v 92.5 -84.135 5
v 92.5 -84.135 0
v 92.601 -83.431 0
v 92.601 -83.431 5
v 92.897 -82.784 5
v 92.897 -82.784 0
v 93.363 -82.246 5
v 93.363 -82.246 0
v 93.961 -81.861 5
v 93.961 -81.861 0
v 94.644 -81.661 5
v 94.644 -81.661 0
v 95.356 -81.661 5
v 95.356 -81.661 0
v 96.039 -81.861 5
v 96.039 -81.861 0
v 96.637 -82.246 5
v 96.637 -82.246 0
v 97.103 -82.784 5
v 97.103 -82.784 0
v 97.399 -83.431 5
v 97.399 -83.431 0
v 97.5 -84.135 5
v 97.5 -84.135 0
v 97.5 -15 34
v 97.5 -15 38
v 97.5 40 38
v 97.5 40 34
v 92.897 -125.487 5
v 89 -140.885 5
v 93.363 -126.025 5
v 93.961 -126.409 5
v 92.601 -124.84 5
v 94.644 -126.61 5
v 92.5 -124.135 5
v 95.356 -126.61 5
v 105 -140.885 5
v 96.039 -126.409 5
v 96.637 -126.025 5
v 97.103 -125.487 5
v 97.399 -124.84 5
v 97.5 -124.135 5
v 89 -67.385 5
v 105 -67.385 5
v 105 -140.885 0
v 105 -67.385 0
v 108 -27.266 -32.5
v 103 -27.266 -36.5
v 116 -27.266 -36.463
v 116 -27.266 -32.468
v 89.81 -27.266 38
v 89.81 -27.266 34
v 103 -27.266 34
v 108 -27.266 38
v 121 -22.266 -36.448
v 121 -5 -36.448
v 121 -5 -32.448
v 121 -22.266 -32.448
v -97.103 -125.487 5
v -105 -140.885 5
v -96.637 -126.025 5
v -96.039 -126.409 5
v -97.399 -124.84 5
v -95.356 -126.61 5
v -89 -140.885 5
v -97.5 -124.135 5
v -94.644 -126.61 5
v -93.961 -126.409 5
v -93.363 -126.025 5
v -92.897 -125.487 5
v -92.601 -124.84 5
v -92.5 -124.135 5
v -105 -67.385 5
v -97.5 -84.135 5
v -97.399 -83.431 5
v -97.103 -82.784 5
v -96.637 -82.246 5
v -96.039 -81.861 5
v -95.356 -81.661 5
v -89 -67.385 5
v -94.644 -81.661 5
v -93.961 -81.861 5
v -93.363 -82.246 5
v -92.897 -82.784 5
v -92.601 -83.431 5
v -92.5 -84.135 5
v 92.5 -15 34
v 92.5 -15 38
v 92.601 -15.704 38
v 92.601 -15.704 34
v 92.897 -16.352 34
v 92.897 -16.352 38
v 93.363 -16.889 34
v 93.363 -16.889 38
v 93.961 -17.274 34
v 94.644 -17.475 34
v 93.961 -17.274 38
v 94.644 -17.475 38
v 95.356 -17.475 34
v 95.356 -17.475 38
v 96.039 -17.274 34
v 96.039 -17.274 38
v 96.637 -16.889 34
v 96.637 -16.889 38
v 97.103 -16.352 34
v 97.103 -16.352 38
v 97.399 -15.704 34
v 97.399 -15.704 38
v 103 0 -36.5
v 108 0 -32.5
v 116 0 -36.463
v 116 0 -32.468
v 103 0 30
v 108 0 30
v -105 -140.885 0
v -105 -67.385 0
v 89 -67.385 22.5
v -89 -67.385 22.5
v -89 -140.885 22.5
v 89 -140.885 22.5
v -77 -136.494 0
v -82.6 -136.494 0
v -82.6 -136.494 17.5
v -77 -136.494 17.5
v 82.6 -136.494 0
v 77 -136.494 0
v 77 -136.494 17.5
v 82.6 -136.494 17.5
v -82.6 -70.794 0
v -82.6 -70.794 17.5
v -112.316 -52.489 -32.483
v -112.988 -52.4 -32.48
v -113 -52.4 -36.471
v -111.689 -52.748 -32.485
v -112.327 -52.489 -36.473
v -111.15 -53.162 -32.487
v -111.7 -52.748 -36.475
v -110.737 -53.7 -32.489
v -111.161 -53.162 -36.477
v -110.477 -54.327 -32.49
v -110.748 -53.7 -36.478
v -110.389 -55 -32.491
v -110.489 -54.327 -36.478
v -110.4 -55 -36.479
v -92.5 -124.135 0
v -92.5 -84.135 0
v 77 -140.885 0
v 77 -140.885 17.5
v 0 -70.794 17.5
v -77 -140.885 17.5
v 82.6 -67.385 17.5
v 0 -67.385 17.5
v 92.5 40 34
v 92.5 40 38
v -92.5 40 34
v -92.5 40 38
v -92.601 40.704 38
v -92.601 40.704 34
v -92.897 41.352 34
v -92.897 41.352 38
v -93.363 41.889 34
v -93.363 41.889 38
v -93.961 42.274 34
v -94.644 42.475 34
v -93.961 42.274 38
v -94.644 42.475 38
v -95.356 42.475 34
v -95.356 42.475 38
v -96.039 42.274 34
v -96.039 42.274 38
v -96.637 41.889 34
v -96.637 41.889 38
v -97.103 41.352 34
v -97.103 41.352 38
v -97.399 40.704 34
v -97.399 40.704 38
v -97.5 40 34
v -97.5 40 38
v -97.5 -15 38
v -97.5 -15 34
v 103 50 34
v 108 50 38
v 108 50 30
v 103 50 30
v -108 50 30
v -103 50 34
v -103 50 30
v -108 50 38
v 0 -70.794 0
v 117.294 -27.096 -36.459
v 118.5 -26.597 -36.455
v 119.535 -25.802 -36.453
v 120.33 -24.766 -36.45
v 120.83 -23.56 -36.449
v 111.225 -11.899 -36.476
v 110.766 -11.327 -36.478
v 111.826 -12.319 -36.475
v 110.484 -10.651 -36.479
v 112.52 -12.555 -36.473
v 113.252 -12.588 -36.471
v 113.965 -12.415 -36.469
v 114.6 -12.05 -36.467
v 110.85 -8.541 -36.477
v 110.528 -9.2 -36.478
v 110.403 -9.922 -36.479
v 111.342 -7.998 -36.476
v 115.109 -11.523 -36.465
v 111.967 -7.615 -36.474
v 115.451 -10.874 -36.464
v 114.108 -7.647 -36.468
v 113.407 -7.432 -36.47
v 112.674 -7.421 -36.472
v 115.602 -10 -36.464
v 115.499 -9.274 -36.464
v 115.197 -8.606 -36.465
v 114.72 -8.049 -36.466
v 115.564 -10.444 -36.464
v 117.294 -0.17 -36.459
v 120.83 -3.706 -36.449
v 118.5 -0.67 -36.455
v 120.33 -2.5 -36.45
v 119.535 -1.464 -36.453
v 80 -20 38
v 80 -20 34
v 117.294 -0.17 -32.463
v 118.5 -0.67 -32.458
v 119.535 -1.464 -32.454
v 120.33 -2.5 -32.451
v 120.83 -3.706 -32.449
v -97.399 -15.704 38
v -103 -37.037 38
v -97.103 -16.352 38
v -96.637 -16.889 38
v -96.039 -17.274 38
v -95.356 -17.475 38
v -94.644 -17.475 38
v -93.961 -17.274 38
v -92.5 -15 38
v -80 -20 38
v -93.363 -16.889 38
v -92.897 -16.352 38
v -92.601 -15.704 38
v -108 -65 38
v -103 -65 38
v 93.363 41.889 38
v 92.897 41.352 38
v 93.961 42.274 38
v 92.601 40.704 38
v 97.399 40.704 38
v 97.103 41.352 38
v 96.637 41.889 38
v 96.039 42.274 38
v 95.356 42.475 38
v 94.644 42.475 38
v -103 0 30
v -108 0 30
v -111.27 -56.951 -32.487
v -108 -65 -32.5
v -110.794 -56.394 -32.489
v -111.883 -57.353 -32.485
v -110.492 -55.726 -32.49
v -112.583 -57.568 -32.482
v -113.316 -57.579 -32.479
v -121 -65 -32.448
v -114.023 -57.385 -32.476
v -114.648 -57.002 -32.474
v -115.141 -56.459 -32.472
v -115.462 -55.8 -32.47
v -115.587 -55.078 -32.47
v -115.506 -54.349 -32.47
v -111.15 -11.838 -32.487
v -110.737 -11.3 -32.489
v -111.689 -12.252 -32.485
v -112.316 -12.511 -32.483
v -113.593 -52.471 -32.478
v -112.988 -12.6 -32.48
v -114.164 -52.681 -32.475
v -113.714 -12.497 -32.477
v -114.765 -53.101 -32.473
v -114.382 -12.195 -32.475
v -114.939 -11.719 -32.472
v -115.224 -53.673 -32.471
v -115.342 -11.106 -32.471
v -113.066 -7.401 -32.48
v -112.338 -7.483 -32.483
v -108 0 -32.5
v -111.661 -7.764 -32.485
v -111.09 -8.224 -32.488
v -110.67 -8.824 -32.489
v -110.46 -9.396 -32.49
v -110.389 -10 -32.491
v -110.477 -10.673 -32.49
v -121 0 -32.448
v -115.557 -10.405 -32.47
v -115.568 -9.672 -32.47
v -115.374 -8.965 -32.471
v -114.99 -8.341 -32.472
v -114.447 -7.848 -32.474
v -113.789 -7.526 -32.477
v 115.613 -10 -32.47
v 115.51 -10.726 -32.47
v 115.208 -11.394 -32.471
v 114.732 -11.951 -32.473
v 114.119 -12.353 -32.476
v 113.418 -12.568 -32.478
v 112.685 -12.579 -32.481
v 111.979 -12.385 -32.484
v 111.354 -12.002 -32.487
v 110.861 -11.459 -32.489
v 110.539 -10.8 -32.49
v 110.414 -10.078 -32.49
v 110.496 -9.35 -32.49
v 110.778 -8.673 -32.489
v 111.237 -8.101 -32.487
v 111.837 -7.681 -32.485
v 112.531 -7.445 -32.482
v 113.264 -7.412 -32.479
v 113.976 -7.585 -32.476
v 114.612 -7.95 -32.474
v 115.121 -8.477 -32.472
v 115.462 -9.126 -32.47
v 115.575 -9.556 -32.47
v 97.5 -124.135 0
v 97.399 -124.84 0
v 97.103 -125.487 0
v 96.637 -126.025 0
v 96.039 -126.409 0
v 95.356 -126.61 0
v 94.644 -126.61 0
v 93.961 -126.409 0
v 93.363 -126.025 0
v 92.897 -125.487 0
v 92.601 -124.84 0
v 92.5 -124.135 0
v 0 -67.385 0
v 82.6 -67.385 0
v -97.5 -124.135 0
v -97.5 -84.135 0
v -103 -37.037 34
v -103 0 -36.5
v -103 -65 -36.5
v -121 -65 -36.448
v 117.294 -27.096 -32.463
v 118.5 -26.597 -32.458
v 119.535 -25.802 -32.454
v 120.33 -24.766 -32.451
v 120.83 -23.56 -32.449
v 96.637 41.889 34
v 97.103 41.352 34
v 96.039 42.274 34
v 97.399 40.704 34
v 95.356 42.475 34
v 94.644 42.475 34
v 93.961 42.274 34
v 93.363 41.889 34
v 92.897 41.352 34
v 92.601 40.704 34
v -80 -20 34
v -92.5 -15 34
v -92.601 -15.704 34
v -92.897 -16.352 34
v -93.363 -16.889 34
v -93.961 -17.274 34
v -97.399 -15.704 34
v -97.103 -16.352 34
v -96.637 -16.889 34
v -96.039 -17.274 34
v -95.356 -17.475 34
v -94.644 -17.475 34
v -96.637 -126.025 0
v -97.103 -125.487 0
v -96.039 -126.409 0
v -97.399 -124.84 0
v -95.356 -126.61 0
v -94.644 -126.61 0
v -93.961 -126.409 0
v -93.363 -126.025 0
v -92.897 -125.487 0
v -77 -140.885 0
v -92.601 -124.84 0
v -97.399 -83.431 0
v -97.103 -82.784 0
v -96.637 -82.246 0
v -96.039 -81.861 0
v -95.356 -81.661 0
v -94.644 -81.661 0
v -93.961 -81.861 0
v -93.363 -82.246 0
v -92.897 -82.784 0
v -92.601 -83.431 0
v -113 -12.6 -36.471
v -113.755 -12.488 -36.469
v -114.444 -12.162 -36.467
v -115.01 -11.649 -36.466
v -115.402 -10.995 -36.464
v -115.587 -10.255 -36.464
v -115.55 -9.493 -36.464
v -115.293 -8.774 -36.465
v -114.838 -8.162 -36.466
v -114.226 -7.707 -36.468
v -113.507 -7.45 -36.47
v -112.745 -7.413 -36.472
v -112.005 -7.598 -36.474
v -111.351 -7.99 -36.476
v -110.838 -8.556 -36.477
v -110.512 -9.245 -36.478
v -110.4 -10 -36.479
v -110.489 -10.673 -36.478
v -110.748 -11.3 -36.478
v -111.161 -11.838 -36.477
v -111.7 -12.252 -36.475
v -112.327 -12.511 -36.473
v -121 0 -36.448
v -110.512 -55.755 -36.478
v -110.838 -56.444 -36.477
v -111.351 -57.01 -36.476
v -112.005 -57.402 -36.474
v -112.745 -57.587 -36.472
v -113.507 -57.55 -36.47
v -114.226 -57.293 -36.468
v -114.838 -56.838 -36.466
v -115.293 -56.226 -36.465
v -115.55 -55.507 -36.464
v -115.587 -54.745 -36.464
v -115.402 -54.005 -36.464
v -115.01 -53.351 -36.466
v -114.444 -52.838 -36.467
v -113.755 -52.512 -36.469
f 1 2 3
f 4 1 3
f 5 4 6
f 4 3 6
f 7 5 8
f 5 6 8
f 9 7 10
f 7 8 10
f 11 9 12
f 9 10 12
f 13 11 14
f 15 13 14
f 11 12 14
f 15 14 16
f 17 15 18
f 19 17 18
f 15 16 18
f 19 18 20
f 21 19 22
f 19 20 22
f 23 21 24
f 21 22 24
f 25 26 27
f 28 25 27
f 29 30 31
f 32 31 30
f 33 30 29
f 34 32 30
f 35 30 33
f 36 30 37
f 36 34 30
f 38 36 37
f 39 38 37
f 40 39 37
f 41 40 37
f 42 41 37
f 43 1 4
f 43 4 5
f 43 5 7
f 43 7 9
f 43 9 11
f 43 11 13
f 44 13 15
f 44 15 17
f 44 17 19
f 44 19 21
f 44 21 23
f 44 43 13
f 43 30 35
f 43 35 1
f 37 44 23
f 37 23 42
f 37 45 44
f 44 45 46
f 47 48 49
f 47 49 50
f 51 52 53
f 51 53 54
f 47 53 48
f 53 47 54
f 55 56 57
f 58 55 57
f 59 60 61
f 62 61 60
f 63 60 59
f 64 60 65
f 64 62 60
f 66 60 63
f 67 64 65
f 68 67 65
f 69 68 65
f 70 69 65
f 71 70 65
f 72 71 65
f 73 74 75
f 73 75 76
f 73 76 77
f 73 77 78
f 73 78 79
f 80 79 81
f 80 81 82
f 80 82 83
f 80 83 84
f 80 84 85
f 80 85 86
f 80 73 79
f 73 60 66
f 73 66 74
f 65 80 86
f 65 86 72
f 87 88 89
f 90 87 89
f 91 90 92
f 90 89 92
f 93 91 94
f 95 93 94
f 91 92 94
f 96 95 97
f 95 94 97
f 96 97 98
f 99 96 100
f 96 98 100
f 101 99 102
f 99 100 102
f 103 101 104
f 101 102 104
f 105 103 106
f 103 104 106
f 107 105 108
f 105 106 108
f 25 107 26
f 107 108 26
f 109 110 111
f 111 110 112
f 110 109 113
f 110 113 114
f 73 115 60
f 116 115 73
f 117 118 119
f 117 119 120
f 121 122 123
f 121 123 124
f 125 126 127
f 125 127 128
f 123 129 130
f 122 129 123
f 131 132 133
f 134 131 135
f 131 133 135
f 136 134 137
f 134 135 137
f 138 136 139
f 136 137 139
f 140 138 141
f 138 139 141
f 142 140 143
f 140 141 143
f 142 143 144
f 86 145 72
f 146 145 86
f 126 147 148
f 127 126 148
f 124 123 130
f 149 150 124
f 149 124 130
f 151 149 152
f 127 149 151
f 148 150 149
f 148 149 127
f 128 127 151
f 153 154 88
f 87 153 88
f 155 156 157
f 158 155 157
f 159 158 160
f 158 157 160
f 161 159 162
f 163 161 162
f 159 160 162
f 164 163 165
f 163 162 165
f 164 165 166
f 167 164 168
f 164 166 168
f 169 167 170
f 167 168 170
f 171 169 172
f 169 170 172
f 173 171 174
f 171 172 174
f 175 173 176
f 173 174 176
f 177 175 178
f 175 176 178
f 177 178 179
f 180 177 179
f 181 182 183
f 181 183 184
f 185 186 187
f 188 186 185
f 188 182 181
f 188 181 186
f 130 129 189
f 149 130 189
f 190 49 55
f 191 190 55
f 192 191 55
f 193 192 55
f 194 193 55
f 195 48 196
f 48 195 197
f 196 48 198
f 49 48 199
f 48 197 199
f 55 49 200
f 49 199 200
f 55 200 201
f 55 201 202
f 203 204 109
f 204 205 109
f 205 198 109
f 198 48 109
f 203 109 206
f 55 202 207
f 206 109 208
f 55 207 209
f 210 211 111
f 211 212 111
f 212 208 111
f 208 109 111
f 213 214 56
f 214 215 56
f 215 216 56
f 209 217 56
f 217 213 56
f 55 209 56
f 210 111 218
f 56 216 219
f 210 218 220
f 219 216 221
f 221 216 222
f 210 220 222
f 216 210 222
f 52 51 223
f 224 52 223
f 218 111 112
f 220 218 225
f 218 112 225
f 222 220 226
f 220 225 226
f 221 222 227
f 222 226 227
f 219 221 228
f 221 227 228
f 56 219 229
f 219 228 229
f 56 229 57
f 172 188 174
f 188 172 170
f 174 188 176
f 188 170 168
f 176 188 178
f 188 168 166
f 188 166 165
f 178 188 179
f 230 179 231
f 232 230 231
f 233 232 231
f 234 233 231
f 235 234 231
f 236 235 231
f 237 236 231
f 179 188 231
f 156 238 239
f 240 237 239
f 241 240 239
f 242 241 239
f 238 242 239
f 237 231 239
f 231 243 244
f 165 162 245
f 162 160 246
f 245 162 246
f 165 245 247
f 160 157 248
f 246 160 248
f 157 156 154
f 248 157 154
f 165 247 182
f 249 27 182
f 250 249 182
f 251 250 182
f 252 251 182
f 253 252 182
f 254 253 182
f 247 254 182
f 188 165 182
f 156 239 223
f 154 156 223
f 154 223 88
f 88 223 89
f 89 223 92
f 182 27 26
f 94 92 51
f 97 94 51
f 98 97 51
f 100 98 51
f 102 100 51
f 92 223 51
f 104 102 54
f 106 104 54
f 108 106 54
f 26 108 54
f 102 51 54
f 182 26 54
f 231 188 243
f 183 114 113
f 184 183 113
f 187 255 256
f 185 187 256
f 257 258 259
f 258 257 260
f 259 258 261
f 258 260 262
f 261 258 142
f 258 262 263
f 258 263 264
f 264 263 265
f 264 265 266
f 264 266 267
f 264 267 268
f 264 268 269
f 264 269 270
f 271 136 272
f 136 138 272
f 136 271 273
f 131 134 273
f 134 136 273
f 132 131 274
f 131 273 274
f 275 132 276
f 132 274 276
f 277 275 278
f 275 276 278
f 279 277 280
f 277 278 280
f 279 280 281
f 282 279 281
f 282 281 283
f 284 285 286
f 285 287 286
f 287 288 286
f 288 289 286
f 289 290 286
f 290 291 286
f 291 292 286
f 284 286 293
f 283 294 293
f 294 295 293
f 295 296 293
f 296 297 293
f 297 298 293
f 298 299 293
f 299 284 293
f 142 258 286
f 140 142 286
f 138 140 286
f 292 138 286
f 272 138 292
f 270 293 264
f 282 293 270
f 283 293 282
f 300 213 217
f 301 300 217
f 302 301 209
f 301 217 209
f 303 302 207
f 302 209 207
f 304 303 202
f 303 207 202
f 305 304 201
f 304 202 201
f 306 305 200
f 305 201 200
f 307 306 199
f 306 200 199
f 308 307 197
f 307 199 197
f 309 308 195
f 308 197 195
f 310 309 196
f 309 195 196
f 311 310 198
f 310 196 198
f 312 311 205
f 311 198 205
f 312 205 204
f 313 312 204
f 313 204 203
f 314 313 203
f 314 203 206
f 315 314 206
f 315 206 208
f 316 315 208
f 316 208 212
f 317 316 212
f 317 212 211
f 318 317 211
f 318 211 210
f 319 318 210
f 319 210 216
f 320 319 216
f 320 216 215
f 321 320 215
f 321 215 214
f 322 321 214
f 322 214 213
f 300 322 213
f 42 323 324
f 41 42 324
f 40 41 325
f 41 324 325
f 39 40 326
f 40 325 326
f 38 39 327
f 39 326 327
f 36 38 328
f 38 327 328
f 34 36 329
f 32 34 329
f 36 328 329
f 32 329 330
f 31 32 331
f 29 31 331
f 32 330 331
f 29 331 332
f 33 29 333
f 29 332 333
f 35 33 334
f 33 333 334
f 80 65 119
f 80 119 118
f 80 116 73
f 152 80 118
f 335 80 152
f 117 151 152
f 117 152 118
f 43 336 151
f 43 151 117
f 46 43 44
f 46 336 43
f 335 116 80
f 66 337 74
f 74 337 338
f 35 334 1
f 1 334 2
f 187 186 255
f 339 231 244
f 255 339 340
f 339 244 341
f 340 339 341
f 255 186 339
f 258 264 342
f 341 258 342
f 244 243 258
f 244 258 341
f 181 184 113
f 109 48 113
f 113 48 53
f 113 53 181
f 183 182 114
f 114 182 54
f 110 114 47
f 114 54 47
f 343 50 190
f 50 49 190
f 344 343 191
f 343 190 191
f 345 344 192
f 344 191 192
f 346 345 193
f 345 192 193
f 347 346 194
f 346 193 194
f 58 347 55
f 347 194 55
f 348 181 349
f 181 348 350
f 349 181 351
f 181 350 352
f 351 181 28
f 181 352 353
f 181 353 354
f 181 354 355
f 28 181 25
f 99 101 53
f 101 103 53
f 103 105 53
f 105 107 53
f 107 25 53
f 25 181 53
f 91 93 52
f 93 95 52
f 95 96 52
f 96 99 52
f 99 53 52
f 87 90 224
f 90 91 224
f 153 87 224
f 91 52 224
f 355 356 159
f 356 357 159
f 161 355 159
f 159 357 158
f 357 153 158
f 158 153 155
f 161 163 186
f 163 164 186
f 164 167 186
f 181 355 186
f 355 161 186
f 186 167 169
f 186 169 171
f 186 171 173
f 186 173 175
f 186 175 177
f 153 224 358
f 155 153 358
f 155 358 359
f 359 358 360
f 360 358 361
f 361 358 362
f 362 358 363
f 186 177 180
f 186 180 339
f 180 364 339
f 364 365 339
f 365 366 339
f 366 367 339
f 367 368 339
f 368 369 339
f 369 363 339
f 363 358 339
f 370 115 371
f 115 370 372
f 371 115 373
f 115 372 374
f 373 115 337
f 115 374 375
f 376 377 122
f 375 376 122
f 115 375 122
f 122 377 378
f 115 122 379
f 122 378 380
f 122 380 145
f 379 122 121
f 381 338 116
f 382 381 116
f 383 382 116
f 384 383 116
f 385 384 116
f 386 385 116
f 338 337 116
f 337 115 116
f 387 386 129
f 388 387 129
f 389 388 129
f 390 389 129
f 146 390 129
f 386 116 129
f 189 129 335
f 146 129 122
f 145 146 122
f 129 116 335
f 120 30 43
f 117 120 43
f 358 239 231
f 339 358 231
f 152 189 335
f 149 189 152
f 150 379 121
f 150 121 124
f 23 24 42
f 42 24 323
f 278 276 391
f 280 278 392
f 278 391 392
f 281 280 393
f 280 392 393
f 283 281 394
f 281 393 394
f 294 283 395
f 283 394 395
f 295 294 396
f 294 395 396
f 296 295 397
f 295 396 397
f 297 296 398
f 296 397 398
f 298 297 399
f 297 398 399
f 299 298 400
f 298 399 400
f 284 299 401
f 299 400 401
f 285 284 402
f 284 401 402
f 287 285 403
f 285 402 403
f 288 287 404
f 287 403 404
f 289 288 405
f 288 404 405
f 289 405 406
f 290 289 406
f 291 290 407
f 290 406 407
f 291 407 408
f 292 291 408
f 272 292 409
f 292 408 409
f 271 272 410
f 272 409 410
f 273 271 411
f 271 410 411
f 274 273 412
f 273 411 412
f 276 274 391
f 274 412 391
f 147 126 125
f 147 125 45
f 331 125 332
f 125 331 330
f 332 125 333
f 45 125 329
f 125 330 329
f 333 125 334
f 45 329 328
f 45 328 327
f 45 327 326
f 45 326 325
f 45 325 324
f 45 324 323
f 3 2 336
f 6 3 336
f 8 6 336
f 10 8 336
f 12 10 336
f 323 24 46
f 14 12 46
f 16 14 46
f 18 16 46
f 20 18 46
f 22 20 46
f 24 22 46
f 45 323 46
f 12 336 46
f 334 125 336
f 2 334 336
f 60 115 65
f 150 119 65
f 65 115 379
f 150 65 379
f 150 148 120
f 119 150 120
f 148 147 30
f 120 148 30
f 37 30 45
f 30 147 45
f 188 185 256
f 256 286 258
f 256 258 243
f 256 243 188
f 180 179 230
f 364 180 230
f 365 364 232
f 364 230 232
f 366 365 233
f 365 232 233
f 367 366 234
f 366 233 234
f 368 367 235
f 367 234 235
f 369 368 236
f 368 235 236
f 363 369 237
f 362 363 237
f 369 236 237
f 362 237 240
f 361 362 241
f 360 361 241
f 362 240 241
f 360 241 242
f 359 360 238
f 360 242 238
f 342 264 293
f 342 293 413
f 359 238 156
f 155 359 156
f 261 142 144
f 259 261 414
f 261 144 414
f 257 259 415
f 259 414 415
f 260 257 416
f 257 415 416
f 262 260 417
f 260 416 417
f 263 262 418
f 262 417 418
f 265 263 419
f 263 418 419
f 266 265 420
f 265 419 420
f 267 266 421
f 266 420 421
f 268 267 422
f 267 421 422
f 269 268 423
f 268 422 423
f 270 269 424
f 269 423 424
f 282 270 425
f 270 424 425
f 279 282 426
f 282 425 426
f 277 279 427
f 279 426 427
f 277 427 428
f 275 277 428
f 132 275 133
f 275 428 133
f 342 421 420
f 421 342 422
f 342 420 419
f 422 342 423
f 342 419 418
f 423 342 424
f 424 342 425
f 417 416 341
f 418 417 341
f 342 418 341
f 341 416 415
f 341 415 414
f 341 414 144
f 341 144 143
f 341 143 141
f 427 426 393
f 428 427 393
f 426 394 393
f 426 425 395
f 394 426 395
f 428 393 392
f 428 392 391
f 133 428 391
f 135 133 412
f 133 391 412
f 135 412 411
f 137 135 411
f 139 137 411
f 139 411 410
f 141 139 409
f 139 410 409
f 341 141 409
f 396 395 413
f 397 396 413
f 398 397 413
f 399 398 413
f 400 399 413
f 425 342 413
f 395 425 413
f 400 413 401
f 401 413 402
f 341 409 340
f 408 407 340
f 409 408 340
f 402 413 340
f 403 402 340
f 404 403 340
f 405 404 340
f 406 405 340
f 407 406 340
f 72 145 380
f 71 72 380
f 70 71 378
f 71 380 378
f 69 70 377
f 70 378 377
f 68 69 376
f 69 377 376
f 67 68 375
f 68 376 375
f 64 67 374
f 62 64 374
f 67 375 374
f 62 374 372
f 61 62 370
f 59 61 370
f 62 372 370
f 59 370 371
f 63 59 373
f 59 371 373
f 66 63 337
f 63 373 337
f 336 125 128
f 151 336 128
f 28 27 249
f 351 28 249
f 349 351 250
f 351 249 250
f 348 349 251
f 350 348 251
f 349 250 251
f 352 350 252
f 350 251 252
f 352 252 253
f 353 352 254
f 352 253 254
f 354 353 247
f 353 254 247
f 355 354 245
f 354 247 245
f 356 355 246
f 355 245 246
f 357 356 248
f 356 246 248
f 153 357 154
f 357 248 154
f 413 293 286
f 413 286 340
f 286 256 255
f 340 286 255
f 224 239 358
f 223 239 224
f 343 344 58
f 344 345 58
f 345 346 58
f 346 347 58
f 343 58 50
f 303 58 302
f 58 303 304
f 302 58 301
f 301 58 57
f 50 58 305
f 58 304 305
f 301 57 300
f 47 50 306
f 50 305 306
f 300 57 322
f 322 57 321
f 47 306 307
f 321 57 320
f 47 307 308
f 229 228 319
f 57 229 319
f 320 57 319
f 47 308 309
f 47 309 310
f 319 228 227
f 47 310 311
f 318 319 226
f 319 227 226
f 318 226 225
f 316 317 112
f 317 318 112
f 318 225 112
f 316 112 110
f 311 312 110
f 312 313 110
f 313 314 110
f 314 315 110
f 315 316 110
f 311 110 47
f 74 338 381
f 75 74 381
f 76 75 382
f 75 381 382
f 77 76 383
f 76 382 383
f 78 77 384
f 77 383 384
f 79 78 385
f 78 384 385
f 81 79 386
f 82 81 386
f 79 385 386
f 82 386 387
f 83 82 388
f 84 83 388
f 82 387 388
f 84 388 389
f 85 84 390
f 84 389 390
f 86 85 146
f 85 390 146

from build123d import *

# Parameters (mm, degrees)
F1_DEPTH  = 65
F2_W      = 160
F2_H      = 45
F3_DEPTH  = 4
F4_W      = 5
F4_H      = 4
F5_DEPTH  = 50
F6_W      = 37.7336093783
F6_H      = 70.5
F6_H_2    = 4.8720824718
F7_DEPTH  = 25
F8_R      = 2.6
F9_DEPTH  = 25
F10_R     = 5
F12_DEPTH = 25
F13_W     = 210
F13_H     = 73.5
F13_W_2   = 185
F13_H_2   = 40
F14_DEPTH = 5
F15_W     = 178
F15_H     = 73.5
F16_DEPTH = 17.5
F17_W     = 165.2
F17_H     = 65.7
F18_DEPTH = 17.5
F19_W     = 154
F19_H     = 17.5
F20_DEPTH = 25
F21_W     = 82.6
F21_H     = 17.5
F22_DEPTH = 25


# Not quite as in the source:
# - a feature names something its author has since deleted; it is built from what else it names


with BuildPart() as f1:
    # F0 (on Front) → F1 (new body)
    with BuildSketch(Plane.XZ):
        Polygon((108, -32.5), (108, 38), (-108, 38), (-108, -32.5), (-120.9999257403, -32.4482956199), (-120.9999257403, -36.4482956199), (-103, -36.5), (-103, 34), (0, 34), (103, 34), (103, -36.5), (120.9999257403, -36.4482956199), (120.9999257403, -32.4482956199), align=None)
    extrude(amount=F1_DEPTH)

    # F2 (on face) → F3 (cut, through all)
    with BuildSketch(Plane.XY.offset(38)):
        with Locations((0, -42.5)):
            Rectangle(F2_W, F2_H)
        Polygon((80, -20), (80, -65), (107, -65), (107, -40), align=None)
        Polygon((-103, -65), (-80, -65), (-80, -20), (-103, -37.037037037), align=None)
    extrude(amount=-F3_DEPTH, mode=Mode.SUBTRACT)

    # F4 (on face) → F5 (join)
    with BuildSketch(Plane(origin=(0, 0, 0), x_dir=(-1, 0, 0), z_dir=(0, 1, 0))):
        Polygon((103, 38), (-108, 38), (-108, 34), (-103, 34), (103, 34), align=None)
        with Locations((-105.5, 32)):
            Rectangle(F4_W, F4_H)
        Polygon((108, 38), (103, 38), (103, 34), (103, 30), (108, 30), (108, 34), align=None)
    extrude(amount=F5_DEPTH)

    # F6 (on face) → F7 (cut, symmetric)
    with BuildSketch(Plane.YZ.offset(108)):
        with Locations((-46.1331953108, 2.75)):
            Rectangle(F6_W, F6_H)
        with Locations((-46.1331953108, -34.9360412359)):
            Rectangle(F6_W, F6_H_2)
    extrude(amount=F7_DEPTH, both=True, mode=Mode.SUBTRACT)

    # F8 (on face) → F9 (cut)
    with BuildSketch(Plane(origin=(-0.1056944195, 0, -36.7955615686), x_dir=(0.9999958745, 0, -0.0028724656), z_dir=(-0.0028724656, 0, -0.9999958745))):
        with BuildLine():
            ThreePointArc((-112.8947300766, 12.6), (-114.7332077077, 8.1615223689), (-110.2947300766, 10))
            ThreePointArc((-110.2947300766, 10), (-111.0562524455, 11.8384776311), (-112.8947300766, 12.6))
        make_face()
        with BuildLine():
            ThreePointArc((-110.2947300766, 55), (-114.7332077077, 56.8384776311), (-112.8947300766, 52.4))
            ThreePointArc((-112.8947300766, 52.4), (-111.0562524455, 53.1615223689), (-110.2947300766, 55))
        make_face()
        with Locations((113.1061197876, 55)):
            Circle(F8_R)
        with Locations((113.1061197876, 10)):
            Circle(F8_R)
    extrude(amount=-F9_DEPTH, mode=Mode.SUBTRACT)

    # F10
    f10_edges = [f1.edges().sort_by_distance(p)[0] for p in [
        (120.999926, 0, -34.448296),
        (120.999926, -27.266391, -34.448296),
    ]]
    fillet(f10_edges, radius=F10_R)

    # F11 (on face) → F12 (cut)
    with BuildSketch(Plane.XY.offset(38)):
        with BuildLine():
            Line((-95, 40), (-92.5, 40))
            ThreePointArc((-92.5, 40), (-95, 42.5), (-97.5, 40))
            ThreePointArc((-97.5, 40), (-96.767766953, 38.232233047), (-95, 37.5))
            Line((-95, 37.5), (-95, 40))
        make_face()
        with BuildLine():
            ThreePointArc((-95, 37.5), (-93.232233047, 38.232233047), (-92.5, 40))
            Line((-92.5, 40), (-95, 40))
            Line((-95, 40), (-95, 37.5))
        make_face()
        with BuildLine():
            Line((-92.5, 0), (-95, 0))
            Line((-95, 0), (-95, 2.5))
            ThreePointArc((-95, 2.5), (-96.767766953, 1.767766953), (-97.5, 0))
            ThreePointArc((-97.5, 0), (-95, -2.5), (-92.5, 0))
        make_face()
        with BuildLine():
            Line((-95, 2.5), (-95, 0))
            Line((-95, 0), (-92.5, 0))
            ThreePointArc((-92.5, 0), (-93.232233047, 1.767766953), (-95, 2.5))
        make_face()
        with BuildLine():
            Line((95, 0), (92.5, 0))
            ThreePointArc((92.5, 0), (93.232233047, -1.767766953), (95, -2.5))
            Line((95, -2.5), (95, 0))
        make_face()
        with BuildLine():
            ThreePointArc((95, 2.5), (93.232233047, 1.767766953), (92.5, 0))
            Line((92.5, 0), (95, 0))
            Line((95, 0), (95, 2.5))
        make_face()
        with BuildLine():
            ThreePointArc((97.5, 40), (95, 42.5), (92.5, 40))
            Line((92.5, 40), (95, 40))
            Line((95, 40), (95, 37.5))
            ThreePointArc((95, 37.5), (96.767766953, 38.232233047), (97.5, 40))
        make_face()
        with BuildLine():
            Line((95, 40), (92.5, 40))
            ThreePointArc((92.5, 40), (93.232233047, 38.232233047), (95, 37.5))
            Line((95, 37.5), (95, 40))
        make_face()
        with BuildLine():
            Line((95, 37.5), (95, 2.5))
            ThreePointArc((95, 2.5), (96.767766953, 1.767766953), (97.5, 0))
            Line((97.5, 0), (97.5, 40))
            ThreePointArc((97.5, 40), (96.767766953, 38.232233047), (95, 37.5))
        make_face()
        with BuildLine():
            Line((95, 2.5), (95, 0))
            Line((95, 0), (95, -2.5))
            ThreePointArc((95, -2.5), (96.767766953, -1.767766953), (97.5, 0))
            ThreePointArc((97.5, 0), (96.767766953, 1.767766953), (95, 2.5))
        make_face()
        with BuildLine():
            ThreePointArc((97.5, 0), (96.767766953, -1.767766953), (95, -2.5))
            Line((95, -2.5), (95, -12.5))
            ThreePointArc((95, -12.5), (96.767766953, -13.232233047), (97.5, -15))
            Line((97.5, -15), (97.5, 0))
        make_face()
        with BuildLine():
            ThreePointArc((95, -12.5), (93.232233047, -13.232233047), (92.5, -15))
            ThreePointArc((92.5, -15), (95, -17.5), (97.5, -15))
            ThreePointArc((97.5, -15), (96.767766953, -13.232233047), (95, -12.5))
        make_face()
        with BuildLine():
            Line((92.5, 40), (92.5, 0))
            ThreePointArc((92.5, 0), (93.232233047, 1.767766953), (95, 2.5))
            Line((95, 2.5), (95, 37.5))
            ThreePointArc((95, 37.5), (93.232233047, 38.232233047), (92.5, 40))
        make_face()
        with BuildLine():
            ThreePointArc((95, -2.5), (93.232233047, -1.767766953), (92.5, 0))
            Line((92.5, 0), (92.5, -15))
            ThreePointArc((92.5, -15), (93.232233047, -13.232233047), (95, -12.5))
            Line((95, -12.5), (95, -2.5))
        make_face()
        with BuildLine():
            ThreePointArc((-95, 2.5), (-93.232233047, 1.767766953), (-92.5, 0))
            Line((-92.5, 0), (-92.5, 40))
            ThreePointArc((-92.5, 40), (-93.232233047, 38.232233047), (-95, 37.5))
            Line((-95, 37.5), (-95, 2.5))
        make_face()
        with BuildLine():
            ThreePointArc((-97.5, 0), (-96.767766953, 1.767766953), (-95, 2.5))
            Line((-95, 2.5), (-95, 37.5))
            ThreePointArc((-95, 37.5), (-96.767766953, 38.232233047), (-97.5, 40))
            Line((-97.5, 40), (-97.5, 0))
        make_face()
        with BuildLine():
            ThreePointArc((-97.5, -15), (-95, -17.5), (-92.5, -15))
            ThreePointArc((-92.5, -15), (-95, -12.5), (-97.5, -15))
        make_face()
        with BuildLine():
            Line((-92.5, -15), (-92.5, 0))
            ThreePointArc((-92.5, 0), (-95, -2.5), (-97.5, 0))
            Line((-97.5, 0), (-97.5, -15))
            ThreePointArc((-97.5, -15), (-95, -12.5), (-92.5, -15))
        make_face()
    extrude(amount=-F12_DEPTH, mode=Mode.SUBTRACT)


with BuildPart() as f14:
    # F13 (on Top) → F14 (new body)
    with BuildSketch(Plane.XY):
        with Locations((0, -104.1353195906)):
            Rectangle(F13_W, F13_H)
        with BuildLine():
            ThreePointArc((97.5, -124.1353195906), (95, -126.6353195906), (92.5, -124.1353195906))
            Line((92.5, -124.1353195906), (-92.5, -124.1353195906))
            ThreePointArc((-92.5, -124.1353195906), (-95, -126.6353195906), (-97.5, -124.1353195906))
            Line((-97.5, -124.1353195906), (-97.5, -84.1353195906))
            ThreePointArc((-97.5, -84.1353195906), (-95, -81.6353195906), (-92.5, -84.1353195906))
            Line((-92.5, -84.1353195906), (92.5, -84.1353195906))
            ThreePointArc((92.5, -84.1353195906), (95, -81.6353195906), (97.5, -84.1353195906))
            Line((97.5, -84.1353195906), (97.5, -124.1353195906))
        make_face(mode=Mode.SUBTRACT)
        with Locations((0, -104.1353195906)):
            Rectangle(F13_W_2, F13_H_2)
    extrude(amount=F14_DEPTH)

    # F15 (on face) → F16 (join)
    with BuildSketch(Plane.XY.offset(5)):
        with Locations((0, -104.1353195906)):
            Rectangle(F15_W, F15_H)
    extrude(amount=F16_DEPTH)

    # F17 (on face) → F18 (cut)
    with BuildSketch(Plane(origin=(0, 0, 0), x_dir=(1, 0, 0), z_dir=(0, 0, -1))):
        with Locations((0, 103.6443784833)):
            Rectangle(F17_W, F17_H)
    extrude(amount=-F18_DEPTH, mode=Mode.SUBTRACT)

    # F19 (on face) → F20 (cut)
    with BuildSketch(Plane.XZ.offset(140.8853195906)):
        with Locations((0, 8.75)):
            Rectangle(F19_W, F19_H)
    extrude(amount=-F20_DEPTH, mode=Mode.SUBTRACT)

    # F21 (on face) → F22 (cut)
    with BuildSketch(Plane.XZ.offset(70.7943784833)):
        with Locations((41.3, 8.75)):
            Rectangle(F21_W, F21_H)
    extrude(amount=-F22_DEPTH, mode=Mode.SUBTRACT)


solid = Compound([f1.part, f14.part])
